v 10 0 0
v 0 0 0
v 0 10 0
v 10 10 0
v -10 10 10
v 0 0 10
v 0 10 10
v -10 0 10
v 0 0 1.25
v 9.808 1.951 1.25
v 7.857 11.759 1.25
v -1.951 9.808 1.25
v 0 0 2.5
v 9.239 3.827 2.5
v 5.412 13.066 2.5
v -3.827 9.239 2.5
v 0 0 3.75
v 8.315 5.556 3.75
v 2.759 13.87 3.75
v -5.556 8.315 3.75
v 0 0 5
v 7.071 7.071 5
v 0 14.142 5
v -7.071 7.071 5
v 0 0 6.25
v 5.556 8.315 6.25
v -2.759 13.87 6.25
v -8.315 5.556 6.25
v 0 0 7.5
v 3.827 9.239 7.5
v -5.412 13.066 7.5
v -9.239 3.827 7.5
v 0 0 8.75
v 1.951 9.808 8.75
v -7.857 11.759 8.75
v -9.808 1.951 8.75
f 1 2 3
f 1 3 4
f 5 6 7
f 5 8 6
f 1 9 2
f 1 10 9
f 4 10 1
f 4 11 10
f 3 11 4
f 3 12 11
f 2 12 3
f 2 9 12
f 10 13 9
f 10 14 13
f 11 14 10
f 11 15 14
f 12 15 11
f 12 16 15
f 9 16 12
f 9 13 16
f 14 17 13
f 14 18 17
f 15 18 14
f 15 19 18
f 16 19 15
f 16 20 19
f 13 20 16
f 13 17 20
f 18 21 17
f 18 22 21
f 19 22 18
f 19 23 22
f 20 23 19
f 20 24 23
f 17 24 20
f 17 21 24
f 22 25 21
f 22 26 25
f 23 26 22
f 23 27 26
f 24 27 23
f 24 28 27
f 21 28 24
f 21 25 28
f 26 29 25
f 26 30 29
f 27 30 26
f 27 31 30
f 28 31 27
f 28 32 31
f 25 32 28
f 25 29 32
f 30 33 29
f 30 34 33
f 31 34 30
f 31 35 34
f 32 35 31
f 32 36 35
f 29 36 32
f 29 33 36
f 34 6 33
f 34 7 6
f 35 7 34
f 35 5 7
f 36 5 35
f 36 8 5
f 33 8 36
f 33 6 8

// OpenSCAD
// Negative twist mirrors the positive case, so its volume must match
// ext_linear_twist. A twisted wall quad is non-planar and its two diagonals
// enclose different volumes, so the split has to follow the twist direction.
linear_extrude(height=10, twist=-90) square(10);
